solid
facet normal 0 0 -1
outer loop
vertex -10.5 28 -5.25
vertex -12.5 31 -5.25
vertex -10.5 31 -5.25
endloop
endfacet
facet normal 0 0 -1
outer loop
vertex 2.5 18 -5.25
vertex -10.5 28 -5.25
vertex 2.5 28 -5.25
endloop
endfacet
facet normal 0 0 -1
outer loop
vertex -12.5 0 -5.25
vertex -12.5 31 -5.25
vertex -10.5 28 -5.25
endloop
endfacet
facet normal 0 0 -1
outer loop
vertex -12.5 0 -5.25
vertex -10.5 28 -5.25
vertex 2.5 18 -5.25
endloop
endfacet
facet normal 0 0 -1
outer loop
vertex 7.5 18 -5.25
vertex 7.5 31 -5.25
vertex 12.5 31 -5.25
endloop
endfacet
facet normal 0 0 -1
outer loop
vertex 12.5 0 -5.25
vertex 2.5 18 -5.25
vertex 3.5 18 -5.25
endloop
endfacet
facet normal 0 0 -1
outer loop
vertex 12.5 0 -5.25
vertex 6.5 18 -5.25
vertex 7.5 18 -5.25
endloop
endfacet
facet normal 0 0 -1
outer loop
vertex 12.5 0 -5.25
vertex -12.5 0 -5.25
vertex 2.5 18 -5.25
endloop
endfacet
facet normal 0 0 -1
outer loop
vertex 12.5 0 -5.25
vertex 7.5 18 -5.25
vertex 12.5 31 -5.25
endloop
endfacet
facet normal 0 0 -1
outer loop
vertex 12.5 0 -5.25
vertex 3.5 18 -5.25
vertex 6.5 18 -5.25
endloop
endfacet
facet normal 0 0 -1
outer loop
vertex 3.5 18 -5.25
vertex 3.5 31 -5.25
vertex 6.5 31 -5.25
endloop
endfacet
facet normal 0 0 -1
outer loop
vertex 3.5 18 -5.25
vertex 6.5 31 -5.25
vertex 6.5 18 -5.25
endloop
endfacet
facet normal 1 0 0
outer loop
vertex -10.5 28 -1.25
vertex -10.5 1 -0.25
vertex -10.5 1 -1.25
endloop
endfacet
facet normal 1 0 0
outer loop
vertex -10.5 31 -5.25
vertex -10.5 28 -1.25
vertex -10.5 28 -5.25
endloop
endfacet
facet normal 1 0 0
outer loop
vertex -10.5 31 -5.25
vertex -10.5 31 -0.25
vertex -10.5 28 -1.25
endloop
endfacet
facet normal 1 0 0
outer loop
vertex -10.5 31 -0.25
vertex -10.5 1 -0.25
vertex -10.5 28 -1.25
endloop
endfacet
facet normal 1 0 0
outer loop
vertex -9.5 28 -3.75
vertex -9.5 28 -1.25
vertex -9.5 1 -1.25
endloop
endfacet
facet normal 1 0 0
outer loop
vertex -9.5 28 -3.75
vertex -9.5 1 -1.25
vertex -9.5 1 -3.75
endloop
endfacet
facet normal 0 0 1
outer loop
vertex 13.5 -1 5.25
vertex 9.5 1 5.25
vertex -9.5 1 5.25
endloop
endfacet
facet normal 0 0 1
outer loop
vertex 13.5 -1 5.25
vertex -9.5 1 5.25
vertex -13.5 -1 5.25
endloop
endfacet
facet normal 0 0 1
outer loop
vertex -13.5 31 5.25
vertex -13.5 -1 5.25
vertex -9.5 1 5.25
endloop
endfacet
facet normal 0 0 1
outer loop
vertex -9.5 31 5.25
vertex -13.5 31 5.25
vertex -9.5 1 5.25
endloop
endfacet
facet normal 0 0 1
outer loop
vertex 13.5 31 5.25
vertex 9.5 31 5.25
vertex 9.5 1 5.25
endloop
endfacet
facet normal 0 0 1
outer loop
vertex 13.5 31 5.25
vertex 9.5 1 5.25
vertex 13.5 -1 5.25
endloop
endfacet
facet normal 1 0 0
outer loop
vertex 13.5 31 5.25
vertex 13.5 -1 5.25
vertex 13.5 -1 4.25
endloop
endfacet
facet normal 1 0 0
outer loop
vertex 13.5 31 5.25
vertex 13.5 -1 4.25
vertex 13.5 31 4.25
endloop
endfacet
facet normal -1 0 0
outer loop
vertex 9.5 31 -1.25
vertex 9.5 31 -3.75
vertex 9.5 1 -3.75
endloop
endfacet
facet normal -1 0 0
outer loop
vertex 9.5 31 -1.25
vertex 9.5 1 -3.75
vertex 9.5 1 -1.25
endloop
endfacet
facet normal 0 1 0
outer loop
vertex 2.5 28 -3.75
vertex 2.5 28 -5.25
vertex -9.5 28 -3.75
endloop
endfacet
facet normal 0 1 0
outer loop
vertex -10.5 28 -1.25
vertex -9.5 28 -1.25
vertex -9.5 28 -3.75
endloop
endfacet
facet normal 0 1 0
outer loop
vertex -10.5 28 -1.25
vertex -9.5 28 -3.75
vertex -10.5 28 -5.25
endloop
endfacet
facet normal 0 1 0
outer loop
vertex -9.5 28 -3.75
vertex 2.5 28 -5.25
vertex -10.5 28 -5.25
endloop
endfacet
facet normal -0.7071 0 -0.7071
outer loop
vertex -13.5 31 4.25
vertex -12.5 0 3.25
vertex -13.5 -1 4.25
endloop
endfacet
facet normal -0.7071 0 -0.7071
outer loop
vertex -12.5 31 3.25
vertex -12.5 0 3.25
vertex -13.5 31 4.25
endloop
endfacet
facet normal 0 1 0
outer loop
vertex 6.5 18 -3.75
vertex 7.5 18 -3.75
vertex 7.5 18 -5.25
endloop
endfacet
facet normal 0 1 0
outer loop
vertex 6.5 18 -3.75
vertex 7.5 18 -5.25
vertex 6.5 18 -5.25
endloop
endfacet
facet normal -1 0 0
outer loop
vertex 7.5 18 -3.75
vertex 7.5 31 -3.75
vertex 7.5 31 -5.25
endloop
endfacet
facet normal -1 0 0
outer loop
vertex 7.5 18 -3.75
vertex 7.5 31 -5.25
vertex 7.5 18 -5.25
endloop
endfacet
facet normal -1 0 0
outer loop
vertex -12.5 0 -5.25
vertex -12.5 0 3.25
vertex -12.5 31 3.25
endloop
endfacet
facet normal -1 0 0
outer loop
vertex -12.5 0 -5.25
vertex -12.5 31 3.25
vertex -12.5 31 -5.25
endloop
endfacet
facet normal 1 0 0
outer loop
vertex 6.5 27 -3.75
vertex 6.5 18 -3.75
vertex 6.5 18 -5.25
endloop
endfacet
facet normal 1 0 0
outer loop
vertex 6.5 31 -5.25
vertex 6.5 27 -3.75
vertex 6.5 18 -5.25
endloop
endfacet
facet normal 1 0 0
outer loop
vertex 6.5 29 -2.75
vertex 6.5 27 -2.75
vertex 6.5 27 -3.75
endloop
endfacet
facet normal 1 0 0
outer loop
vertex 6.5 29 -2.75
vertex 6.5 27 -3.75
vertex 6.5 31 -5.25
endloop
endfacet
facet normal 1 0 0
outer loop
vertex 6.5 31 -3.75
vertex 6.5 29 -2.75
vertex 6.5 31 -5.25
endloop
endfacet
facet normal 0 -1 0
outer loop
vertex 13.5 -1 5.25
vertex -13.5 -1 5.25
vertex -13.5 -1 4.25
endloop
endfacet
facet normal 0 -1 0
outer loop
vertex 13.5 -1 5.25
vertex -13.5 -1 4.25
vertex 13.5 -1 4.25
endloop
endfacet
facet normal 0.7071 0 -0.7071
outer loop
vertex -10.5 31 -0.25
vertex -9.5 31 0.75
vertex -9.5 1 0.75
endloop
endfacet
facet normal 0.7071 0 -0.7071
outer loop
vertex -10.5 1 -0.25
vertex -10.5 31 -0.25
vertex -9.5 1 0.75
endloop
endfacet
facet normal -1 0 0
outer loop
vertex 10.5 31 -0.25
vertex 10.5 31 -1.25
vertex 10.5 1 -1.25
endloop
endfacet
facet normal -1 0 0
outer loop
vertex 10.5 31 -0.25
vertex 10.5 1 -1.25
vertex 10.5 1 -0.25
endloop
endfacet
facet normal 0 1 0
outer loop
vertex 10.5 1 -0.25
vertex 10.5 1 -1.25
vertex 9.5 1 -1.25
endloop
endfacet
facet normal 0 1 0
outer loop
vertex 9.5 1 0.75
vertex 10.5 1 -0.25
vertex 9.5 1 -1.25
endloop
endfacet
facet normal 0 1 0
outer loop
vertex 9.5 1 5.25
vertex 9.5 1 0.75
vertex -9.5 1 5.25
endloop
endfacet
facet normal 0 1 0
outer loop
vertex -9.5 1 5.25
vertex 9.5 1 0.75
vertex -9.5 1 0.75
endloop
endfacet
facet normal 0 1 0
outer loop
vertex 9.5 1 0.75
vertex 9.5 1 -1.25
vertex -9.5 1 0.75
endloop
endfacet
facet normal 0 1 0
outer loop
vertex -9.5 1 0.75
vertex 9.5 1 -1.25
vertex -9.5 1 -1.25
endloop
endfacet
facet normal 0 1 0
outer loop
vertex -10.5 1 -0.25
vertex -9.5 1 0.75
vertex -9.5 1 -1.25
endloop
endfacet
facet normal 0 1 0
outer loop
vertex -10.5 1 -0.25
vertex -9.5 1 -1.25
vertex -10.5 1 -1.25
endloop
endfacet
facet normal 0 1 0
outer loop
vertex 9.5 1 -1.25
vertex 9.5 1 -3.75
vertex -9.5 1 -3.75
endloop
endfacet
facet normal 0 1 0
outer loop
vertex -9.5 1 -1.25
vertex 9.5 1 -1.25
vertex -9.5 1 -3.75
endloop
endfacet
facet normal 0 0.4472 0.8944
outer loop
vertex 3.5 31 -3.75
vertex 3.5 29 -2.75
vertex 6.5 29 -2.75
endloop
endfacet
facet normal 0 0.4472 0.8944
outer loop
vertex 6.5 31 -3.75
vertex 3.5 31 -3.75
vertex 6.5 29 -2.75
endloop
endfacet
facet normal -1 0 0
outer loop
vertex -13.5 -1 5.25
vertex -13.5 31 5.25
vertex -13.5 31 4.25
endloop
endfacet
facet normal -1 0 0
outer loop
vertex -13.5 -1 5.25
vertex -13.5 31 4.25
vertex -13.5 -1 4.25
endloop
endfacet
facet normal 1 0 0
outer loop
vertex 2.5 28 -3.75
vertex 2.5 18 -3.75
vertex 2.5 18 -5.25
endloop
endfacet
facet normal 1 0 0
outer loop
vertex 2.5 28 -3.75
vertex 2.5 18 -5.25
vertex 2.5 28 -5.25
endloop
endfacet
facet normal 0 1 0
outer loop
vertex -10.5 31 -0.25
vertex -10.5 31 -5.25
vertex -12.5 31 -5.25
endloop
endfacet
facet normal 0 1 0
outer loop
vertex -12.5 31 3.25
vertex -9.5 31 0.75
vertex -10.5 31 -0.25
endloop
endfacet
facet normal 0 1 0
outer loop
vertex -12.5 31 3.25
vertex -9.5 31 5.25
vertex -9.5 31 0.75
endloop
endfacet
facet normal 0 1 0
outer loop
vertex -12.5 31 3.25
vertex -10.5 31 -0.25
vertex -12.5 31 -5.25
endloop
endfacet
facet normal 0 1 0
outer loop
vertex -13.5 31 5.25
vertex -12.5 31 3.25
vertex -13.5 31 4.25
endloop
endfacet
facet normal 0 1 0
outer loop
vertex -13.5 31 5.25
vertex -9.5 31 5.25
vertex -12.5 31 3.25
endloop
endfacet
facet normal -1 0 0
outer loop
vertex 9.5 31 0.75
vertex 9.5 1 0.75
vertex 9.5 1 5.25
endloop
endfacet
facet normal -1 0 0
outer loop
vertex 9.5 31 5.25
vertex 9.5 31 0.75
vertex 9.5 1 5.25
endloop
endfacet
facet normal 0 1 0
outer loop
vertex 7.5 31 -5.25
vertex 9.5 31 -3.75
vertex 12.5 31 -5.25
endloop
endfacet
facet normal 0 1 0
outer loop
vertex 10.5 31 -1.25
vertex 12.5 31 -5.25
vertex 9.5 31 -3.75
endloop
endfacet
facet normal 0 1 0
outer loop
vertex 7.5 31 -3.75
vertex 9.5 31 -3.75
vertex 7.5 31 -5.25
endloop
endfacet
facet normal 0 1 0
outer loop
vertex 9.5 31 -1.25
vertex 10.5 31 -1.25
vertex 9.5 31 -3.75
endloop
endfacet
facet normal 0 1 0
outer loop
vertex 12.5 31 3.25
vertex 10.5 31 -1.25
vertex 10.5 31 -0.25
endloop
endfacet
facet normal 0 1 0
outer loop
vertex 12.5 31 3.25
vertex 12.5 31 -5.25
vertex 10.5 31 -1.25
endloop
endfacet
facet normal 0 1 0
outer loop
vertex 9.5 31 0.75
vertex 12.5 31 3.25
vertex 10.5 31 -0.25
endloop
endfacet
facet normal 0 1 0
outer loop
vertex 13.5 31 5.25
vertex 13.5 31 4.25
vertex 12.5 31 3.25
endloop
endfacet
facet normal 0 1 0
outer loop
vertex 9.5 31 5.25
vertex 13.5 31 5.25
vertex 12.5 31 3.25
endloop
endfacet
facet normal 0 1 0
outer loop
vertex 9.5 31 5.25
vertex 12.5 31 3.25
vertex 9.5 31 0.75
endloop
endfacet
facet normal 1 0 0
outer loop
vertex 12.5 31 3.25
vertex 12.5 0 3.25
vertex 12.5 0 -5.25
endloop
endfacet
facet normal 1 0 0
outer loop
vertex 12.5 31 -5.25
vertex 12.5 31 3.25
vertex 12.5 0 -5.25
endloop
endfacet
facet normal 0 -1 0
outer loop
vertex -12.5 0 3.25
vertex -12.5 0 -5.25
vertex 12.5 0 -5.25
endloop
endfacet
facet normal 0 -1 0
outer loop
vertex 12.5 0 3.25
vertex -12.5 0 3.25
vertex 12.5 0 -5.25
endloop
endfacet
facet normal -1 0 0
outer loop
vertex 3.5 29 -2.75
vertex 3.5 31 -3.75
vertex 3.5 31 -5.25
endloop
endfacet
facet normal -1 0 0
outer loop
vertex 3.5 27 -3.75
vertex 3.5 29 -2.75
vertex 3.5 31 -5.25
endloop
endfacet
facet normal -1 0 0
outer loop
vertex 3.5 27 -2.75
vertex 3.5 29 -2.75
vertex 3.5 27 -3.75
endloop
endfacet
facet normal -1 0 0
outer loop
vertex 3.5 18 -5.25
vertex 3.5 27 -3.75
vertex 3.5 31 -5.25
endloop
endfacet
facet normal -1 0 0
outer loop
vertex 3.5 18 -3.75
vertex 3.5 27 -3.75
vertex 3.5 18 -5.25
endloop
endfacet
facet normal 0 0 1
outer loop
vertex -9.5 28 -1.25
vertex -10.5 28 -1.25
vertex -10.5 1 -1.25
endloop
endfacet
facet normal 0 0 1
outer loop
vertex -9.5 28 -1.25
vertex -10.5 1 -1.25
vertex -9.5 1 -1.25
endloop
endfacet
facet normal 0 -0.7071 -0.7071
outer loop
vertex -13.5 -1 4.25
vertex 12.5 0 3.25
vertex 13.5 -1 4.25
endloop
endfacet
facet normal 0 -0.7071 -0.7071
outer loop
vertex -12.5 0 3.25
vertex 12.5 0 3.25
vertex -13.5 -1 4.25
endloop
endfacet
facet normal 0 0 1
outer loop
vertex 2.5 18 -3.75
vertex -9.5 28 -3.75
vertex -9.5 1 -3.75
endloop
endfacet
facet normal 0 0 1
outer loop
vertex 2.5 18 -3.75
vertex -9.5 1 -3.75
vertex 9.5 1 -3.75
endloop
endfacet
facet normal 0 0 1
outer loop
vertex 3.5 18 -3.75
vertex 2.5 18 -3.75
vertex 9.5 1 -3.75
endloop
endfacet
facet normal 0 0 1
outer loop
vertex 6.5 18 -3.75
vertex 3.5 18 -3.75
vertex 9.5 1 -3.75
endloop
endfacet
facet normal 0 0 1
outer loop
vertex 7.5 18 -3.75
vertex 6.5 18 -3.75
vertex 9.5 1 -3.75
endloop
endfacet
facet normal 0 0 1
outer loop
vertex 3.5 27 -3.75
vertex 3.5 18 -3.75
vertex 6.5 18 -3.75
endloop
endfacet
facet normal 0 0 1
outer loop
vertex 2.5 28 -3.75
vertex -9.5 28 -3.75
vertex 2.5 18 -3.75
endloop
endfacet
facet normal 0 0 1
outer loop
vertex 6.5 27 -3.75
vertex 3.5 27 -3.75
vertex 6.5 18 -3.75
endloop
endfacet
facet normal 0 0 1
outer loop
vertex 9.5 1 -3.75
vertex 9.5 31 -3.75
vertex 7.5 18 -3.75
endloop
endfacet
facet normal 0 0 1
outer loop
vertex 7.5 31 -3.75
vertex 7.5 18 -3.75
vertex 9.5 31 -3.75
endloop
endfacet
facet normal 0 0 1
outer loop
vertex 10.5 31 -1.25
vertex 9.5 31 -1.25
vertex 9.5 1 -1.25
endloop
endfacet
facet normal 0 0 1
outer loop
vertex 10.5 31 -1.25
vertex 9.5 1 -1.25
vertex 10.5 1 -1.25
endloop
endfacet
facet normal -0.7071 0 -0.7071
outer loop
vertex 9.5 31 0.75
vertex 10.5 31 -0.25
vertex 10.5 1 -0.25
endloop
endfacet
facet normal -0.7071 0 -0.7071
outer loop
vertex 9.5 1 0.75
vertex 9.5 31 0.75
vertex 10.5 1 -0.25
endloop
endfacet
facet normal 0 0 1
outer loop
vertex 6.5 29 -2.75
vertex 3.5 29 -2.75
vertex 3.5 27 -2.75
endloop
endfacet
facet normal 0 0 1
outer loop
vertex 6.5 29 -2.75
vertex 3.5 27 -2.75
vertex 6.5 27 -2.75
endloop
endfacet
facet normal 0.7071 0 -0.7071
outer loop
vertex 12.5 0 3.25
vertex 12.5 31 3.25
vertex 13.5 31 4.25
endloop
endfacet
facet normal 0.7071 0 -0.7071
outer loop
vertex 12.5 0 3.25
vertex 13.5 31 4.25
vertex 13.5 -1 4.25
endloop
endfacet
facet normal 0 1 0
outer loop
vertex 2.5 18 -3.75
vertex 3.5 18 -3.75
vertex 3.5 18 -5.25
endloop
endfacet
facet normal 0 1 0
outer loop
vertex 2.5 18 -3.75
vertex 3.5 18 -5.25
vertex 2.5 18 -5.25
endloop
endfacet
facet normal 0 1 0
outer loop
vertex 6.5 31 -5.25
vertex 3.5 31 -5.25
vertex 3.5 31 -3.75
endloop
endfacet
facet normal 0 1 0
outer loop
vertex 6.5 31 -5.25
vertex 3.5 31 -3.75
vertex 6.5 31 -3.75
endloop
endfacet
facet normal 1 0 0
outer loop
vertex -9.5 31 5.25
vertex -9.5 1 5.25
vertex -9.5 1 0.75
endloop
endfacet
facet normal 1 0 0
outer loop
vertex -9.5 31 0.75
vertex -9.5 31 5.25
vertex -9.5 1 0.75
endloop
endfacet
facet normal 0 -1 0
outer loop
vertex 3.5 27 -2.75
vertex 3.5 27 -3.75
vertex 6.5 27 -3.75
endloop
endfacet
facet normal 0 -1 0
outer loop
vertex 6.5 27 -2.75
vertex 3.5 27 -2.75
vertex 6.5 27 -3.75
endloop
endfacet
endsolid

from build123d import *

# Parameters (mm, degrees)
SKETCH1_W               = 25
SKETCH1_H               = 10.5
BOSS_EXTRUDE1_DEPTH     = 31
CUT_EXTRUDE1_DEPTH      = 30
SKETCH8_W               = 3
SKETCH8_H               = 2
BOSS_EXTRUDE4_DEPTH     = 1
CHAMFER1_SIZE2          = 1
CHAMFER1_SIZE           = 2
CUT_EXTRUDE_THIN1_DEPTH = 35.615747861
CUT_EXTRUDE5_REACH      = 37.036
SKETCH10_W              = 13
SKETCH10_H              = 3
EXTRUDE_THIN1_DEPTH     = 1
CHAMFER2_SIZE           = 1
CHAMFER3_SIZE           = 1


with BuildPart() as part:
    # Sketch1 → Boss-Extrude1 (new body)
    with BuildSketch(Plane(origin=(0, 0, 0), x_dir=(1, 0, 0), z_dir=(0, 1, 0))):
        Rectangle(SKETCH1_W, SKETCH1_H)
    extrude(amount=BOSS_EXTRUDE1_DEPTH)

    # Sketch2 → Cut-Extrude1 (cut)
    with BuildSketch(Plane(origin=(0, 31, 0), x_dir=(1, 0, 0), z_dir=(0, 1, 0))):
        Polygon((-9.5, 3.75), (9.5, 3.75), (9.5, 1.25), (10.5, 1.25), (10.5, -0.75), (9.5, -0.75), (9.5, -5.25), (-9.5, -5.25), (-9.5, -0.75), (-10.5, -0.75), (-10.5, 1.25), (-9.5, 1.25), align=None)
    extrude(amount=-CUT_EXTRUDE1_DEPTH, mode=Mode.SUBTRACT)

    # Sketch8 → Boss-Extrude4 (add)
    with BuildSketch(Plane.XY.offset(-3.75)):
        with Locations((5, 28)):
            Rectangle(SKETCH8_W, SKETCH8_H)
    extrude(amount=BOSS_EXTRUDE4_DEPTH)

    # Chamfer1
    chamfer1_edges = [part.edges().sort_by_distance(p)[0] for p in [
        (5, 29, -3.75),
    ]]
    chamfer1_side = [part.faces().sort_by_distance(p)[0] for p in [
        (5, 29.02, -3.75),
    ]]
    chamfer(chamfer1_edges, length=CHAMFER1_SIZE - 0.0001, length2=CHAMFER1_SIZE2 - 0.0001, reference=chamfer1_side[0])  # a hair under: the kernel refuses the full size

    # Sketch9 → Cut-Extrude-Thin1 (cut, through all)
    with BuildSketch(Plane.XY.offset(-3.75)):
        Polygon((6.5, 18), (6.5, 31), (3.5, 31), (3.5, 18), (2.5, 18), (2.5, 32), (7.5, 32), (7.5, 18), align=None)
    extrude(amount=-CUT_EXTRUDE_THIN1_DEPTH, mode=Mode.SUBTRACT)

    # Sketch10 → Cut-Extrude5 (cut, up to next)
    with BuildSketch(Plane(origin=(0, 0, -5.25), x_dir=(-1, 0, 0), z_dir=(0, 0, -1)), mode=Mode.PRIVATE) as cut_extrude5_sk1:
        with Locations((4, 29.5)):
            Rectangle(SKETCH10_W, SKETCH10_H)
    cut_extrude5_tool1 = extrude(cut_extrude5_sk1.sketch, amount=-CUT_EXTRUDE5_REACH, mode=Mode.PRIVATE) & part.part
    add(cut_extrude5_tool1.solids().sort_by_distance((-4, 29.5, -5.25))[0], mode=Mode.SUBTRACT)

    # Sketch11 → Extrude-Thin1 (add)
    with BuildSketch(Plane.XY.offset(5.25)):
        Polygon((12.5, 31), (12.5, 0), (-12.5, 0), (-12.5, 31), (-13.5, 31), (-13.5, -1), (13.5, -1), (13.5, 31), align=None)
    extrude(amount=-EXTRUDE_THIN1_DEPTH)

    # Chamfer2
    chamfer2_edges = [part.edges().sort_by_distance(p)[0] for p in [
        (-12.5, 15.5, 4.25),
        (0, 0, 4.25),
        (12.5, 15.5, 4.25),
    ]]
    chamfer(chamfer2_edges, length=CHAMFER2_SIZE - 0.0001)  # a hair under: the kernel refuses the full size

    # Chamfer3
    chamfer3_edges = [part.edges().sort_by_distance(p)[0] for p in [
        (-10.5, 16, 0.75),
        (10.5, 16, 0.75),
    ]]
    chamfer(chamfer3_edges, length=CHAMFER3_SIZE - 0.0001)  # a hair under: the kernel refuses the full size


solid = part.part
